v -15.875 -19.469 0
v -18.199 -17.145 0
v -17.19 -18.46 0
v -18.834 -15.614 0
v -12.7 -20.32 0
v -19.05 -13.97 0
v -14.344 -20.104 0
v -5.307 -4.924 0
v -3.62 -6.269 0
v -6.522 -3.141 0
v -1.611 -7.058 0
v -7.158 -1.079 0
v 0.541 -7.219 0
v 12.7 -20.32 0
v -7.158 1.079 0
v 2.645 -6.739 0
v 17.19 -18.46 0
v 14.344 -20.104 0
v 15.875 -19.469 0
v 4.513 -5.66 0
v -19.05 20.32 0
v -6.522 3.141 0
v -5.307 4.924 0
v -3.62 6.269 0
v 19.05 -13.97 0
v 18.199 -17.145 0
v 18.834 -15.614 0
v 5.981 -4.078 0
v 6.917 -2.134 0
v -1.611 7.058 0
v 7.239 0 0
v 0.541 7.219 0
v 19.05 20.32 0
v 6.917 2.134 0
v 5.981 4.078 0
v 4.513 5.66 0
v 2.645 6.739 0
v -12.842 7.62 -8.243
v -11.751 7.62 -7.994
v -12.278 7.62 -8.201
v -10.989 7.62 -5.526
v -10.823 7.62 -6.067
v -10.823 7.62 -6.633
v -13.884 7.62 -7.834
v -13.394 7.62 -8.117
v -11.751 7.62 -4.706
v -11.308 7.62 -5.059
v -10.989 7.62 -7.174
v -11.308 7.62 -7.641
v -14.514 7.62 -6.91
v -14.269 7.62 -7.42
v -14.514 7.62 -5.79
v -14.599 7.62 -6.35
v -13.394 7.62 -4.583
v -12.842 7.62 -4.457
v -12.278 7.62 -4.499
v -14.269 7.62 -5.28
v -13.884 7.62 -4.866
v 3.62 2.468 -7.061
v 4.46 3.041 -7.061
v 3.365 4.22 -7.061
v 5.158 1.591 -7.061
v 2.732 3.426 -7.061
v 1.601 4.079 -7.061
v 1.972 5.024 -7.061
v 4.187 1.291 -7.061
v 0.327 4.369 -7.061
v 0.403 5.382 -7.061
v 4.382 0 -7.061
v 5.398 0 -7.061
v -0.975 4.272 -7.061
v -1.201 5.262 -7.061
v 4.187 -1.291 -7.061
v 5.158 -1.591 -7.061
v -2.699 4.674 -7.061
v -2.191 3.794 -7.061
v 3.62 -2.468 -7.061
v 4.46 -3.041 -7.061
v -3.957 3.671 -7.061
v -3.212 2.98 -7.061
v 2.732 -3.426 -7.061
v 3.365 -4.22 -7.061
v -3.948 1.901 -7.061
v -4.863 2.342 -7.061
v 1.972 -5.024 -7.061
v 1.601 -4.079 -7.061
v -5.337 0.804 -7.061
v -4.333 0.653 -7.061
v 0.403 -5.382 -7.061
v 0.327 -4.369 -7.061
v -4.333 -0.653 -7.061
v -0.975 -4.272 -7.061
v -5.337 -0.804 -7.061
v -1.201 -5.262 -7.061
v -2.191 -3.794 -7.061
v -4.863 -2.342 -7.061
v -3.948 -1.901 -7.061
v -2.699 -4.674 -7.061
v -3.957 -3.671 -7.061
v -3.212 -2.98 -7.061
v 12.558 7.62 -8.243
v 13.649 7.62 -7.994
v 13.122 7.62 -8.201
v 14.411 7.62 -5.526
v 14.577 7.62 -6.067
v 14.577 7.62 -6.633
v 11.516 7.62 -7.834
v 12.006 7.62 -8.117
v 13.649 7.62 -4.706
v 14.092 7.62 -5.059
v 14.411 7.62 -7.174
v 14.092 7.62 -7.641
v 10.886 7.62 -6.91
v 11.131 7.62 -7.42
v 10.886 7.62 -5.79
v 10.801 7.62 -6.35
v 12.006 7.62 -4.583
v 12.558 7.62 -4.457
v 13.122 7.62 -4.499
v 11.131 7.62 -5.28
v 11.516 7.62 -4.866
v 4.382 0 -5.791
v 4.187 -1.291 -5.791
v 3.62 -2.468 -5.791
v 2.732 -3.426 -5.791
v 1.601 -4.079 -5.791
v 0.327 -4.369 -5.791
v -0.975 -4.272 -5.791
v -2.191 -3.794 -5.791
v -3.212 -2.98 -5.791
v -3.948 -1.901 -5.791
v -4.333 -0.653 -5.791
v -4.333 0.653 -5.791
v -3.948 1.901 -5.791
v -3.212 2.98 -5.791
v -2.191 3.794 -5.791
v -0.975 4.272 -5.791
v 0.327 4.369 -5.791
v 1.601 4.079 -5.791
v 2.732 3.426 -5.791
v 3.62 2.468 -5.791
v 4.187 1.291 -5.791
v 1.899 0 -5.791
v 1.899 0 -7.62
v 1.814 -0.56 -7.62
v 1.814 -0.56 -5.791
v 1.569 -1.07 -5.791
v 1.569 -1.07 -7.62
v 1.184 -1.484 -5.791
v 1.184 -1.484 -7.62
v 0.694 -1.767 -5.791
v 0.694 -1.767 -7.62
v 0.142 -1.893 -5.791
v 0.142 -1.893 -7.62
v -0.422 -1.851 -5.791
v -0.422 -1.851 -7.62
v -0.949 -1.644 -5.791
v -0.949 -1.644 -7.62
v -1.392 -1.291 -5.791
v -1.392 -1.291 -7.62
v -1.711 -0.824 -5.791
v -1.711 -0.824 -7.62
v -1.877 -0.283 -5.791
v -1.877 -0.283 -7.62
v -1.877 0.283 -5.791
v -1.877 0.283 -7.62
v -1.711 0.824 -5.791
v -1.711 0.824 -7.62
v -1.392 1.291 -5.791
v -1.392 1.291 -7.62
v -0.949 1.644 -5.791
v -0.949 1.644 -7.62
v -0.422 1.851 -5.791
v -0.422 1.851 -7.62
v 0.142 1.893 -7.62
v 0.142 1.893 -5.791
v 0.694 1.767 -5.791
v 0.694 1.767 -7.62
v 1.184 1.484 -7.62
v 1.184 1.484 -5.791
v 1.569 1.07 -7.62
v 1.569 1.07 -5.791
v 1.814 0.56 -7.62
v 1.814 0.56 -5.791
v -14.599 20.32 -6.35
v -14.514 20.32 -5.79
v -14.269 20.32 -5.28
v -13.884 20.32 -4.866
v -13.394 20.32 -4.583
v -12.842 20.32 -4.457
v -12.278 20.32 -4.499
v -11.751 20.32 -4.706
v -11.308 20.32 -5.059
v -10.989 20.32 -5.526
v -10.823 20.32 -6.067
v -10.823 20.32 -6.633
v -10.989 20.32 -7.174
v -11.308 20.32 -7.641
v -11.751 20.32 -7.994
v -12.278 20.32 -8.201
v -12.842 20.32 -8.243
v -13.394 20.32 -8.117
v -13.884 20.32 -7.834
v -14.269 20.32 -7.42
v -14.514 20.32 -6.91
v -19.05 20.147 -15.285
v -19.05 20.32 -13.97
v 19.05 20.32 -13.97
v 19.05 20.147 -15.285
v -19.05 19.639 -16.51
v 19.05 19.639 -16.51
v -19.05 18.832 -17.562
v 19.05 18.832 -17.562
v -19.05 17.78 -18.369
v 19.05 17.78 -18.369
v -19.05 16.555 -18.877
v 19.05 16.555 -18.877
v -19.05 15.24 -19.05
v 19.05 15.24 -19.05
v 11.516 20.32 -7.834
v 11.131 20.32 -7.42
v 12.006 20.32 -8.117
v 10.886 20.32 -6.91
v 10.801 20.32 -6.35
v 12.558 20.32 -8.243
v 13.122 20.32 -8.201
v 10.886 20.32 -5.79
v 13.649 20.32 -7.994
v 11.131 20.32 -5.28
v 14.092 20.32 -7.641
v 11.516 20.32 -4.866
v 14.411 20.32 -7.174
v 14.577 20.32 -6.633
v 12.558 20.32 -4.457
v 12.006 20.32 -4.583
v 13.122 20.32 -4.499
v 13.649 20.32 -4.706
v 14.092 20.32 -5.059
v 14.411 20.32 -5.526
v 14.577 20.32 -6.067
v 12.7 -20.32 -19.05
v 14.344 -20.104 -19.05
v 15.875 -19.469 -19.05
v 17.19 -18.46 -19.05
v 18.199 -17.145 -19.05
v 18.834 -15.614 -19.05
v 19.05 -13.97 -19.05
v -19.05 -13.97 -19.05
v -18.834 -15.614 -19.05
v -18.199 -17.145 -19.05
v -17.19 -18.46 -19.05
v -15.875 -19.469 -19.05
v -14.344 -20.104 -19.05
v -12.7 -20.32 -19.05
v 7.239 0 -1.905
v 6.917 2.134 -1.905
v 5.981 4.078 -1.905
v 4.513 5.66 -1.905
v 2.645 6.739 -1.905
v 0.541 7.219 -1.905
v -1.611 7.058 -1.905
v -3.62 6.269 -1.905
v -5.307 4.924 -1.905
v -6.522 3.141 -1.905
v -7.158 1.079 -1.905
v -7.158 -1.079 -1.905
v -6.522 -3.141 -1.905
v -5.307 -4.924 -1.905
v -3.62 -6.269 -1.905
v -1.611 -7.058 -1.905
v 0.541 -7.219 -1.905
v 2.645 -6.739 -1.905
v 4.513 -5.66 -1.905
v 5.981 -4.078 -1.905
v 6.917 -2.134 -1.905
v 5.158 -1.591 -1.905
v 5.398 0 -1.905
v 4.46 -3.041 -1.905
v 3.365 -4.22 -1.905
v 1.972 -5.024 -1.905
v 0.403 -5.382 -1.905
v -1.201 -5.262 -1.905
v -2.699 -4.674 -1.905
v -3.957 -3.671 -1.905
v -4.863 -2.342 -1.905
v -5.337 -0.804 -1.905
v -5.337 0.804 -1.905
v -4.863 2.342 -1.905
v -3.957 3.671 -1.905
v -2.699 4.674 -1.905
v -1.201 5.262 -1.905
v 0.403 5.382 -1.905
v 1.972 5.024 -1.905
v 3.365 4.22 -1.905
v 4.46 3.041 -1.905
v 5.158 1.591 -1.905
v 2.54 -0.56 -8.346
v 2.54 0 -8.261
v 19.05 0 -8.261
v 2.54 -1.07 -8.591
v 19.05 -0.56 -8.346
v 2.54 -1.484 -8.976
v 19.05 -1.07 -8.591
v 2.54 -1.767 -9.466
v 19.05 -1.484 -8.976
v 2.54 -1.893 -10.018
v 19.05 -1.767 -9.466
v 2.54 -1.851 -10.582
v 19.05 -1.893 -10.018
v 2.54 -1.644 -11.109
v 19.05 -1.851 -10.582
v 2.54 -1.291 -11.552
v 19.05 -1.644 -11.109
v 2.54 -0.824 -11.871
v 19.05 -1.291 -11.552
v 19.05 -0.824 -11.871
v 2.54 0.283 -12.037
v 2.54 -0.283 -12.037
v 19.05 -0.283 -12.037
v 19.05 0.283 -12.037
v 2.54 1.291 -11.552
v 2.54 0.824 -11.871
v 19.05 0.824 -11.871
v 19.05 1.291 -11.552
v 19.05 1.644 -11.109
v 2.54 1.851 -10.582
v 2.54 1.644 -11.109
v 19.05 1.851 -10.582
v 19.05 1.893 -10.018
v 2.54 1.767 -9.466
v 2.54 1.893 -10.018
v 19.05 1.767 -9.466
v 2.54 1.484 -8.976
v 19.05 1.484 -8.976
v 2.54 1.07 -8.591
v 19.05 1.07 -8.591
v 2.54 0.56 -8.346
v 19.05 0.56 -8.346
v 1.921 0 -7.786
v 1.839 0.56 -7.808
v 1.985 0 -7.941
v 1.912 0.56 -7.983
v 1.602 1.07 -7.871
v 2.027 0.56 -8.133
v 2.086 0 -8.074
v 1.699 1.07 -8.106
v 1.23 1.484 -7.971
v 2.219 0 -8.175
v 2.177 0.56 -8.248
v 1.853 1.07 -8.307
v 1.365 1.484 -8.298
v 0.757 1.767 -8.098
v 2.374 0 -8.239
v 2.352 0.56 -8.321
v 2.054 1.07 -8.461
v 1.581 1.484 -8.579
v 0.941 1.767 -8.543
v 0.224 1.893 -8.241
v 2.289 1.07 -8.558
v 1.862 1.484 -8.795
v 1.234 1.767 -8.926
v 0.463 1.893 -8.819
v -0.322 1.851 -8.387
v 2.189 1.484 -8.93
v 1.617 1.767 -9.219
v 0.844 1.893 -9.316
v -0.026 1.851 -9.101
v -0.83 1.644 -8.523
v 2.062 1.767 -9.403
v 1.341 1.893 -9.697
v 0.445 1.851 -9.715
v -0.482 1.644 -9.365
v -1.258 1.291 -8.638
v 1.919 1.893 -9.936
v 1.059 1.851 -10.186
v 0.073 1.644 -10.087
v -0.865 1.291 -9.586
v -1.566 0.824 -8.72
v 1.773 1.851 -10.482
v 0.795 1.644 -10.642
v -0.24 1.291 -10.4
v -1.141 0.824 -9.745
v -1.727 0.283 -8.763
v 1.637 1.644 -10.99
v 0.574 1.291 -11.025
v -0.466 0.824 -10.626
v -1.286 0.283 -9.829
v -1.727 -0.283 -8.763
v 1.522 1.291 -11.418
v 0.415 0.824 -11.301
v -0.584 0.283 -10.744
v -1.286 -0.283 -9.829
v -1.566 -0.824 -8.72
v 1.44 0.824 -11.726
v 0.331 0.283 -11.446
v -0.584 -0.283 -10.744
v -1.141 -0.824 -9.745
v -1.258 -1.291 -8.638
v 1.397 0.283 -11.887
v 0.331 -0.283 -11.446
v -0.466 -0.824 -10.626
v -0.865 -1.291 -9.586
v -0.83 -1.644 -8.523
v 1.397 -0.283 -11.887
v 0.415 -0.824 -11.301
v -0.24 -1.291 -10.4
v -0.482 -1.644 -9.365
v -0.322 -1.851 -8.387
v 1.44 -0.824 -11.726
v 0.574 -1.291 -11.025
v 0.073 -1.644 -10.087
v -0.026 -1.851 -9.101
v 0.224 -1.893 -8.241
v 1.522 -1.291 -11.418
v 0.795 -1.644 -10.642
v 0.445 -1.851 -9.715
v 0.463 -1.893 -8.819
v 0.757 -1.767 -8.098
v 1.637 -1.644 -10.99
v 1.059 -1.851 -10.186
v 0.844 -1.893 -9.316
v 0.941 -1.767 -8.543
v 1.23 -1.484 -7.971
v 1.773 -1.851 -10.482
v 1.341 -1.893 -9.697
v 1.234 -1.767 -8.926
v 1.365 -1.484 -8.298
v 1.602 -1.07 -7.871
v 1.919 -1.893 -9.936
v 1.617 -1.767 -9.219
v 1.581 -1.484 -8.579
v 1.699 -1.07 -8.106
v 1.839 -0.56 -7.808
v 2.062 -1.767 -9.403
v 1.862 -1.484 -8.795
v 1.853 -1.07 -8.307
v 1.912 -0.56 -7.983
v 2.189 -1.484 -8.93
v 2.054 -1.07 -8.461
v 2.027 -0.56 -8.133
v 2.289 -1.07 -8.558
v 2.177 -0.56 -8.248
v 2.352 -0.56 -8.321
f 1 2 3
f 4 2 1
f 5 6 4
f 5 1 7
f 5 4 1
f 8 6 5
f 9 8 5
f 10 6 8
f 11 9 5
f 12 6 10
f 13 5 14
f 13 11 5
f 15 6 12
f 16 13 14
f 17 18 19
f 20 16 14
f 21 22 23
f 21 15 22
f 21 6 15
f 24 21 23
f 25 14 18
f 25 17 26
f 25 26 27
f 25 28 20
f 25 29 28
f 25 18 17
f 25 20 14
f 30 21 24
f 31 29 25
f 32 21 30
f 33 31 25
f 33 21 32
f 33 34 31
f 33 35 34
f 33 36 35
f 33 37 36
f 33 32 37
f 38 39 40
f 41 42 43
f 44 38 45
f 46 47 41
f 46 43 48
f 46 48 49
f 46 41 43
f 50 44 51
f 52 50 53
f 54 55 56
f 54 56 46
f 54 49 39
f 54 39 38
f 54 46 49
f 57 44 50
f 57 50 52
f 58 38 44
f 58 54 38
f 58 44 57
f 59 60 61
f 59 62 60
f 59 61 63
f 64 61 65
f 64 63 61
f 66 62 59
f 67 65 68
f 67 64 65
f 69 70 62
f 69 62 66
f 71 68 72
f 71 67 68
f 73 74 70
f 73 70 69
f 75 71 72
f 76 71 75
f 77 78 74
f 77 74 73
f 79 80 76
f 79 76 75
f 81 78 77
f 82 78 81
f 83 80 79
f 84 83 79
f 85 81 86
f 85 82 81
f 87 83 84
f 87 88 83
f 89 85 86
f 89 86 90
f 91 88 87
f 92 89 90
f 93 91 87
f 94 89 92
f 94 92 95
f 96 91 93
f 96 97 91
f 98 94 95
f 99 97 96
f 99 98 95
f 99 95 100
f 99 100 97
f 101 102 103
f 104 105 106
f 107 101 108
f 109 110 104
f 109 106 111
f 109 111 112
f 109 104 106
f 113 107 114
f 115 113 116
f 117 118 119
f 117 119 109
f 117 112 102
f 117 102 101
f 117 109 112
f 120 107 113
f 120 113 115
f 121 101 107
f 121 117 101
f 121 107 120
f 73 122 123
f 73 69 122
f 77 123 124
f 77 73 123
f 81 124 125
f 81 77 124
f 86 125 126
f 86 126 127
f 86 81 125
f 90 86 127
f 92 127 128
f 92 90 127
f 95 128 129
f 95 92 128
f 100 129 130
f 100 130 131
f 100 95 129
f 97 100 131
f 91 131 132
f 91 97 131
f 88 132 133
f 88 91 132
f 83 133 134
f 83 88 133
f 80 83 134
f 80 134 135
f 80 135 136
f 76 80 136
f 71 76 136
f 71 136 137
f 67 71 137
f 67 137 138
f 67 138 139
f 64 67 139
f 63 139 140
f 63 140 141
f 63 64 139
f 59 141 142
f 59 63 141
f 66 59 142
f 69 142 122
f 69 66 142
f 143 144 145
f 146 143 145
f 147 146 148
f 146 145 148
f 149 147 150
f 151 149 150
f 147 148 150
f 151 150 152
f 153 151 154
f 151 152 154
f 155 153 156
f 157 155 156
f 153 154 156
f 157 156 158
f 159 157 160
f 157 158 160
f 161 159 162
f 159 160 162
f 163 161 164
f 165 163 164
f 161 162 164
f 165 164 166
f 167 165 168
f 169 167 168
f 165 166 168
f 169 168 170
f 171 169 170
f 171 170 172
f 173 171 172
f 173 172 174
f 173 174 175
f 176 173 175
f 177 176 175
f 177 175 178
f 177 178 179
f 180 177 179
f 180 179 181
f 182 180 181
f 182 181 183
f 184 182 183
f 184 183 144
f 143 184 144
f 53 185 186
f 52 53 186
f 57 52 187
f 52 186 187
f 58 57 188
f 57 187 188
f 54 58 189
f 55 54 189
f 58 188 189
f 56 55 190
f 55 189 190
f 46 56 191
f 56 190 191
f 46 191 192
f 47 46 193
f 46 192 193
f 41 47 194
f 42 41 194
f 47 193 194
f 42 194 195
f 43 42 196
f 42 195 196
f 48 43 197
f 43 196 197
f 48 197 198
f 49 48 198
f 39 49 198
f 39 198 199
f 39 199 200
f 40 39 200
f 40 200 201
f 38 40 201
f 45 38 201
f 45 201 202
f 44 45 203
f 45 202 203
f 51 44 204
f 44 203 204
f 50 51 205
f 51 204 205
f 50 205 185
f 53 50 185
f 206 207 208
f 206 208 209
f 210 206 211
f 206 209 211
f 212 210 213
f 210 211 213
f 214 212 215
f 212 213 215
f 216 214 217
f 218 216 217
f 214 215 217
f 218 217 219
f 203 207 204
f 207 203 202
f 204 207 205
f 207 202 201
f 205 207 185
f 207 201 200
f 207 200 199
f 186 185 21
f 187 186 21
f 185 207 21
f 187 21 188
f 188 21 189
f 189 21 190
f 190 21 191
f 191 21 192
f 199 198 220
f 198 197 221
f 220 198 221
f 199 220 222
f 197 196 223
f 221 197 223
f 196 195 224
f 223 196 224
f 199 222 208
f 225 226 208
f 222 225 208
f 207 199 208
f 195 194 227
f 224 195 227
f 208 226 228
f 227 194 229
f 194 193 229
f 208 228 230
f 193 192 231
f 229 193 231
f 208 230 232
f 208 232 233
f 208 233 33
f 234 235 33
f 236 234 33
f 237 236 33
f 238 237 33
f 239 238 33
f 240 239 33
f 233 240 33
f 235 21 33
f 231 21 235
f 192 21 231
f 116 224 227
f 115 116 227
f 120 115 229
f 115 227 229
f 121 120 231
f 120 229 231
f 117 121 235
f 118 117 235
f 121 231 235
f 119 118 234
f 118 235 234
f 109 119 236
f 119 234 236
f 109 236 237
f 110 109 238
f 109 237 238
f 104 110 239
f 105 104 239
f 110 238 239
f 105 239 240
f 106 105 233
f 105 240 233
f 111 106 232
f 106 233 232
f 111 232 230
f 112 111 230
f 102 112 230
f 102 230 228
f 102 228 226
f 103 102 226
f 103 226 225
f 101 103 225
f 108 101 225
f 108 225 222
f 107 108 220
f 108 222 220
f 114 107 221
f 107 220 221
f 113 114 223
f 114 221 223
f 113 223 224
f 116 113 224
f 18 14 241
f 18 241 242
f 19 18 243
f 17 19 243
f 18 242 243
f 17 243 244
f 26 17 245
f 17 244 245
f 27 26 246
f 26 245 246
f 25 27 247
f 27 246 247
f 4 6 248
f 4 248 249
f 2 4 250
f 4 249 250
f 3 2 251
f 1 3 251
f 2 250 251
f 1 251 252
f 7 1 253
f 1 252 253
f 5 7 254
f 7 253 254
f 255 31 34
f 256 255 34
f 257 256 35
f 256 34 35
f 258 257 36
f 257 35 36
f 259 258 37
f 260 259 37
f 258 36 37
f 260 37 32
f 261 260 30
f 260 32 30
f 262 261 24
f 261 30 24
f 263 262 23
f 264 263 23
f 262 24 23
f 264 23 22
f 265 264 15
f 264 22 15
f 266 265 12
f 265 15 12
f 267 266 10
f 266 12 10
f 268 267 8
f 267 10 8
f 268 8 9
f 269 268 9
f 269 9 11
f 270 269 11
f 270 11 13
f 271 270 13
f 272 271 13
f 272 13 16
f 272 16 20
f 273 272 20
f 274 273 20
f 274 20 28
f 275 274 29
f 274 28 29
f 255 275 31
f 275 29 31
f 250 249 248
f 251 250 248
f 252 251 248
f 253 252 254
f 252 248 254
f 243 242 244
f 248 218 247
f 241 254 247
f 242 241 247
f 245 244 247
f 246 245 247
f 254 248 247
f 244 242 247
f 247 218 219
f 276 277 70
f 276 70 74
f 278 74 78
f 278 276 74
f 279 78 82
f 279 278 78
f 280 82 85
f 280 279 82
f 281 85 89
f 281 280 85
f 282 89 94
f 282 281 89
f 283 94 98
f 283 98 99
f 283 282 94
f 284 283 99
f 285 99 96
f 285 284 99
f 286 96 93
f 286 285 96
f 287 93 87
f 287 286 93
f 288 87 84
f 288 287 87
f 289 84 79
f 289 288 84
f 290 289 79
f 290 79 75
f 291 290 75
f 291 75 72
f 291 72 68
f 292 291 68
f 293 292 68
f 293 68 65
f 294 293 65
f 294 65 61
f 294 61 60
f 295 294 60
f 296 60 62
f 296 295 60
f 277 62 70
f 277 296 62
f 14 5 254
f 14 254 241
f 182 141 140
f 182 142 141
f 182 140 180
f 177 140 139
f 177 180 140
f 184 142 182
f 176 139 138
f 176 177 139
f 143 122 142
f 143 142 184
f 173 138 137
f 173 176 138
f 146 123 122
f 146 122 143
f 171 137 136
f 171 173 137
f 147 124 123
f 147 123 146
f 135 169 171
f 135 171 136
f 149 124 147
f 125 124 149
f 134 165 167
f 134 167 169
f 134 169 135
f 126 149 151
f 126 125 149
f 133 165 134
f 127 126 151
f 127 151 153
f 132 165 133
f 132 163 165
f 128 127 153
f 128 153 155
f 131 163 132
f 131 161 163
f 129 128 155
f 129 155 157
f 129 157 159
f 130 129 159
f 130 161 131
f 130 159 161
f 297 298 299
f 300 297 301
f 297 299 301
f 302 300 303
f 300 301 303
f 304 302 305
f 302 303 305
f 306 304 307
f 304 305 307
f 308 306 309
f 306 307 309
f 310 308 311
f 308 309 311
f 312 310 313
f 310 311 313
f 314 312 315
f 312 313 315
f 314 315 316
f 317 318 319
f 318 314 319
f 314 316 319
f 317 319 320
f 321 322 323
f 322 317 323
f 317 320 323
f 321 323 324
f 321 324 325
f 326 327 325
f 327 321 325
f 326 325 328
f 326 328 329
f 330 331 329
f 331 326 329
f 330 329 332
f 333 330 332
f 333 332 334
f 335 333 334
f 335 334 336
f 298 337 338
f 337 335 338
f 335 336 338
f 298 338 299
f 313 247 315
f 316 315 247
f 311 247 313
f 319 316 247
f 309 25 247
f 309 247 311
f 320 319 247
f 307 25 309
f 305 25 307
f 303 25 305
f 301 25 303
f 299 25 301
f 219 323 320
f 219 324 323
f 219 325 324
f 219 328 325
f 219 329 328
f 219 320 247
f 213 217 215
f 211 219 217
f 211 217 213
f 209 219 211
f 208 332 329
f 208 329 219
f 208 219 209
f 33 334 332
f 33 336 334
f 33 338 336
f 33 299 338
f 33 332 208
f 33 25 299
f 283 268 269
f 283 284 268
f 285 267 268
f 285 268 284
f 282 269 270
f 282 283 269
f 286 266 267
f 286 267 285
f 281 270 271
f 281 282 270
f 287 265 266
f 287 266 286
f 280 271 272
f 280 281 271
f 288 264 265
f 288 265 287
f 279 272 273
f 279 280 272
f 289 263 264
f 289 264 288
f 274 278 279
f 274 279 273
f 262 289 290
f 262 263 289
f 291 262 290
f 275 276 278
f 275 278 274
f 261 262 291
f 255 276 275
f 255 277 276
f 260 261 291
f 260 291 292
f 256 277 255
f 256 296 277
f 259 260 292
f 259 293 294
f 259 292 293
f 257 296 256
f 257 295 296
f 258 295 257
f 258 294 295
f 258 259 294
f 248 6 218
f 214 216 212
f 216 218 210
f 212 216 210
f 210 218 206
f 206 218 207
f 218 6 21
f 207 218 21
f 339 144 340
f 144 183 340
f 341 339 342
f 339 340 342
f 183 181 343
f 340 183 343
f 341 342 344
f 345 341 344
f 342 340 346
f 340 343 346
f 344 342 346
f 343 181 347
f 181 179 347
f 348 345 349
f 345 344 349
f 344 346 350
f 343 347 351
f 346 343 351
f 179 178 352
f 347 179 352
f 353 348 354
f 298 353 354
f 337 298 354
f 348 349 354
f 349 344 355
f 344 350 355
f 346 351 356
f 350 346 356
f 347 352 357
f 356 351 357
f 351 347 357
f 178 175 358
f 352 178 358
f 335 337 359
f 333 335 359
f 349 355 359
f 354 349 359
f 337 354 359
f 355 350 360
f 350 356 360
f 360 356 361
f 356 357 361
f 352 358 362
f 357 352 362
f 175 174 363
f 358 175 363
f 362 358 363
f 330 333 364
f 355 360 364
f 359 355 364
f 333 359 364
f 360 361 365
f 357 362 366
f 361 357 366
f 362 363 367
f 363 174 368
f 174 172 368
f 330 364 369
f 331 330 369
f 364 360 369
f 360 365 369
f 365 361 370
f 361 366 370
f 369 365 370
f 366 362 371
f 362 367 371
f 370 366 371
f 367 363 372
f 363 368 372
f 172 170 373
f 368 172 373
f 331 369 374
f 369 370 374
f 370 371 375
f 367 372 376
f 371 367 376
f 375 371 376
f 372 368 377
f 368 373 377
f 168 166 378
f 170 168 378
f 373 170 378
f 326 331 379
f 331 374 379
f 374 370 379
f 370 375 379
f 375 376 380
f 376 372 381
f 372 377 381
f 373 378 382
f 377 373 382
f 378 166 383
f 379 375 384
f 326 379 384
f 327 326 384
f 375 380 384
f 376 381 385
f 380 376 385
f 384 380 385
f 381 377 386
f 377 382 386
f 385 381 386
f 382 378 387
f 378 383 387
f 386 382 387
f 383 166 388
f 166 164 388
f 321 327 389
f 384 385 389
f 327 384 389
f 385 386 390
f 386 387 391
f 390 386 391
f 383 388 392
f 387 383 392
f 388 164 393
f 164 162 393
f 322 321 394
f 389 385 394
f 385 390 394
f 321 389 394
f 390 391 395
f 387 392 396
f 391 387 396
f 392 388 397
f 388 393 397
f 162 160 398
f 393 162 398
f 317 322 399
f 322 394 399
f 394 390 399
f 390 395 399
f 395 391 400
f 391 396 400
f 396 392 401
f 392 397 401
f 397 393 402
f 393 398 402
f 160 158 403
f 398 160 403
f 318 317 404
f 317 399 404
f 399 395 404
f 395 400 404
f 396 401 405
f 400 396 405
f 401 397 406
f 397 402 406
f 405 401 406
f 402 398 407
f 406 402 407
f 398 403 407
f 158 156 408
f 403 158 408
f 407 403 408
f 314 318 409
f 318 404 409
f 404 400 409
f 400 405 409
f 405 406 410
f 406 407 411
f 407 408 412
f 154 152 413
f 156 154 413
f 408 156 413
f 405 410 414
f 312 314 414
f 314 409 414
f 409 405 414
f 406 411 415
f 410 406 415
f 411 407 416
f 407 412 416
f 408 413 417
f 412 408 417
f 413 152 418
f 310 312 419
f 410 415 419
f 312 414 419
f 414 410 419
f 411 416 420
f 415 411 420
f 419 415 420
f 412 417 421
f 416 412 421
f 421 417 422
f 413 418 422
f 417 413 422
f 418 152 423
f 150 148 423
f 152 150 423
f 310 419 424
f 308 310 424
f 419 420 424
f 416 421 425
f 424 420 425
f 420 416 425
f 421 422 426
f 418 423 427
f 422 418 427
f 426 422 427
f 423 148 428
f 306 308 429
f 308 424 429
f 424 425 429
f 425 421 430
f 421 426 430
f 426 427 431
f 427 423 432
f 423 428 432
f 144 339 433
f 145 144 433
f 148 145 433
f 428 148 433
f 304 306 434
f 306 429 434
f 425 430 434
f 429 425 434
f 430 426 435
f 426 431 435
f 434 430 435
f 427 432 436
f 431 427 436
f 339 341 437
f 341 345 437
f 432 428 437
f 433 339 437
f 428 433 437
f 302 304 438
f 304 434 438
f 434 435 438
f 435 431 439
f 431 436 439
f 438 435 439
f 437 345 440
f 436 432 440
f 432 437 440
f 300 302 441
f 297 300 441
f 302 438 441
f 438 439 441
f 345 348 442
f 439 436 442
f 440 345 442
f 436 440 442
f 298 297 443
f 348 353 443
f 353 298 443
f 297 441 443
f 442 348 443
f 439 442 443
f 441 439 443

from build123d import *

# Parameters (mm, degrees)
F0_W      = 38.1
F0_H      = 40.64
F1_DEPTH  = 19.05
F4_R      = 7.239
F5_DEPTH  = 1.905
F6_R      = 6.35
F8_R      = 1.89865
F10_R     = 1.89865
F11_DEPTH = 12.7
F12_R     = 5.08


with BuildPart() as f1:
    # F0 (on Top) → F1 (new body)
    with BuildSketch(Plane.XY):
        Rectangle(F0_W, F0_H)
    extrude(amount=-F1_DEPTH)

    # F2 (on Front) → F3 (revolve, cut)
    with BuildSketch(Plane.XZ):
        Polygon((5.3975, 0), (0, 0), (0, -5.7912), (4.3815, -5.7912), (4.3815, -7.0612), (5.3975, -7.0612), align=None)
    revolve(axis=Axis((0, 0, -9.525), (0, 0, -1)), mode=Mode.SUBTRACT)

    # F4 (on face) → F5 (cut)
    with BuildSketch(Plane.XY):
        Circle(F4_R)
    extrude(amount=-F5_DEPTH, mode=Mode.SUBTRACT)

    # F6
    f6_edges = [f1.edges().sort_by_distance(p)[0] for p in [
        (-19.05, -20.32, -9.525),
        (19.05, -20.32, -9.525),
    ]]
    fillet(f6_edges, radius=F6_R)

    # F9: sweep along a path in F7
    with BuildLine(Plane.XZ) as f9_path:
        Line((0, -5.7912), (0, -7.62))
        ThreePointArc((0, -7.62), (0.7439487758, -9.4160512242), (2.54, -10.16))
        Line((2.54, -10.16), (19.05, -10.16))
    # F8 (on face) → F9 (sweep, cut)
    with BuildSketch(Plane.XY.offset(-5.7912)):
        Circle(F8_R)
    sweep(path=f9_path.line, mode=Mode.SUBTRACT)

    # F10 (on face) → F11 (cut)
    with BuildSketch(Plane(origin=(0, 20.32, 0), x_dir=(-1, 0, 0), z_dir=(0, 1, 0))):
        with Locations((-12.7, -6.35)):
            Circle(F10_R)
        with Locations((12.7, -6.35)):
            Circle(F10_R)
    extrude(amount=-F11_DEPTH, mode=Mode.SUBTRACT)

    # F12
    f12_edges = [f1.edges().sort_by_distance(p)[0] for p in [
        (0, 20.32, -19.05),
    ]]
    fillet(f12_edges, radius=F12_R)


solid = f1.part
